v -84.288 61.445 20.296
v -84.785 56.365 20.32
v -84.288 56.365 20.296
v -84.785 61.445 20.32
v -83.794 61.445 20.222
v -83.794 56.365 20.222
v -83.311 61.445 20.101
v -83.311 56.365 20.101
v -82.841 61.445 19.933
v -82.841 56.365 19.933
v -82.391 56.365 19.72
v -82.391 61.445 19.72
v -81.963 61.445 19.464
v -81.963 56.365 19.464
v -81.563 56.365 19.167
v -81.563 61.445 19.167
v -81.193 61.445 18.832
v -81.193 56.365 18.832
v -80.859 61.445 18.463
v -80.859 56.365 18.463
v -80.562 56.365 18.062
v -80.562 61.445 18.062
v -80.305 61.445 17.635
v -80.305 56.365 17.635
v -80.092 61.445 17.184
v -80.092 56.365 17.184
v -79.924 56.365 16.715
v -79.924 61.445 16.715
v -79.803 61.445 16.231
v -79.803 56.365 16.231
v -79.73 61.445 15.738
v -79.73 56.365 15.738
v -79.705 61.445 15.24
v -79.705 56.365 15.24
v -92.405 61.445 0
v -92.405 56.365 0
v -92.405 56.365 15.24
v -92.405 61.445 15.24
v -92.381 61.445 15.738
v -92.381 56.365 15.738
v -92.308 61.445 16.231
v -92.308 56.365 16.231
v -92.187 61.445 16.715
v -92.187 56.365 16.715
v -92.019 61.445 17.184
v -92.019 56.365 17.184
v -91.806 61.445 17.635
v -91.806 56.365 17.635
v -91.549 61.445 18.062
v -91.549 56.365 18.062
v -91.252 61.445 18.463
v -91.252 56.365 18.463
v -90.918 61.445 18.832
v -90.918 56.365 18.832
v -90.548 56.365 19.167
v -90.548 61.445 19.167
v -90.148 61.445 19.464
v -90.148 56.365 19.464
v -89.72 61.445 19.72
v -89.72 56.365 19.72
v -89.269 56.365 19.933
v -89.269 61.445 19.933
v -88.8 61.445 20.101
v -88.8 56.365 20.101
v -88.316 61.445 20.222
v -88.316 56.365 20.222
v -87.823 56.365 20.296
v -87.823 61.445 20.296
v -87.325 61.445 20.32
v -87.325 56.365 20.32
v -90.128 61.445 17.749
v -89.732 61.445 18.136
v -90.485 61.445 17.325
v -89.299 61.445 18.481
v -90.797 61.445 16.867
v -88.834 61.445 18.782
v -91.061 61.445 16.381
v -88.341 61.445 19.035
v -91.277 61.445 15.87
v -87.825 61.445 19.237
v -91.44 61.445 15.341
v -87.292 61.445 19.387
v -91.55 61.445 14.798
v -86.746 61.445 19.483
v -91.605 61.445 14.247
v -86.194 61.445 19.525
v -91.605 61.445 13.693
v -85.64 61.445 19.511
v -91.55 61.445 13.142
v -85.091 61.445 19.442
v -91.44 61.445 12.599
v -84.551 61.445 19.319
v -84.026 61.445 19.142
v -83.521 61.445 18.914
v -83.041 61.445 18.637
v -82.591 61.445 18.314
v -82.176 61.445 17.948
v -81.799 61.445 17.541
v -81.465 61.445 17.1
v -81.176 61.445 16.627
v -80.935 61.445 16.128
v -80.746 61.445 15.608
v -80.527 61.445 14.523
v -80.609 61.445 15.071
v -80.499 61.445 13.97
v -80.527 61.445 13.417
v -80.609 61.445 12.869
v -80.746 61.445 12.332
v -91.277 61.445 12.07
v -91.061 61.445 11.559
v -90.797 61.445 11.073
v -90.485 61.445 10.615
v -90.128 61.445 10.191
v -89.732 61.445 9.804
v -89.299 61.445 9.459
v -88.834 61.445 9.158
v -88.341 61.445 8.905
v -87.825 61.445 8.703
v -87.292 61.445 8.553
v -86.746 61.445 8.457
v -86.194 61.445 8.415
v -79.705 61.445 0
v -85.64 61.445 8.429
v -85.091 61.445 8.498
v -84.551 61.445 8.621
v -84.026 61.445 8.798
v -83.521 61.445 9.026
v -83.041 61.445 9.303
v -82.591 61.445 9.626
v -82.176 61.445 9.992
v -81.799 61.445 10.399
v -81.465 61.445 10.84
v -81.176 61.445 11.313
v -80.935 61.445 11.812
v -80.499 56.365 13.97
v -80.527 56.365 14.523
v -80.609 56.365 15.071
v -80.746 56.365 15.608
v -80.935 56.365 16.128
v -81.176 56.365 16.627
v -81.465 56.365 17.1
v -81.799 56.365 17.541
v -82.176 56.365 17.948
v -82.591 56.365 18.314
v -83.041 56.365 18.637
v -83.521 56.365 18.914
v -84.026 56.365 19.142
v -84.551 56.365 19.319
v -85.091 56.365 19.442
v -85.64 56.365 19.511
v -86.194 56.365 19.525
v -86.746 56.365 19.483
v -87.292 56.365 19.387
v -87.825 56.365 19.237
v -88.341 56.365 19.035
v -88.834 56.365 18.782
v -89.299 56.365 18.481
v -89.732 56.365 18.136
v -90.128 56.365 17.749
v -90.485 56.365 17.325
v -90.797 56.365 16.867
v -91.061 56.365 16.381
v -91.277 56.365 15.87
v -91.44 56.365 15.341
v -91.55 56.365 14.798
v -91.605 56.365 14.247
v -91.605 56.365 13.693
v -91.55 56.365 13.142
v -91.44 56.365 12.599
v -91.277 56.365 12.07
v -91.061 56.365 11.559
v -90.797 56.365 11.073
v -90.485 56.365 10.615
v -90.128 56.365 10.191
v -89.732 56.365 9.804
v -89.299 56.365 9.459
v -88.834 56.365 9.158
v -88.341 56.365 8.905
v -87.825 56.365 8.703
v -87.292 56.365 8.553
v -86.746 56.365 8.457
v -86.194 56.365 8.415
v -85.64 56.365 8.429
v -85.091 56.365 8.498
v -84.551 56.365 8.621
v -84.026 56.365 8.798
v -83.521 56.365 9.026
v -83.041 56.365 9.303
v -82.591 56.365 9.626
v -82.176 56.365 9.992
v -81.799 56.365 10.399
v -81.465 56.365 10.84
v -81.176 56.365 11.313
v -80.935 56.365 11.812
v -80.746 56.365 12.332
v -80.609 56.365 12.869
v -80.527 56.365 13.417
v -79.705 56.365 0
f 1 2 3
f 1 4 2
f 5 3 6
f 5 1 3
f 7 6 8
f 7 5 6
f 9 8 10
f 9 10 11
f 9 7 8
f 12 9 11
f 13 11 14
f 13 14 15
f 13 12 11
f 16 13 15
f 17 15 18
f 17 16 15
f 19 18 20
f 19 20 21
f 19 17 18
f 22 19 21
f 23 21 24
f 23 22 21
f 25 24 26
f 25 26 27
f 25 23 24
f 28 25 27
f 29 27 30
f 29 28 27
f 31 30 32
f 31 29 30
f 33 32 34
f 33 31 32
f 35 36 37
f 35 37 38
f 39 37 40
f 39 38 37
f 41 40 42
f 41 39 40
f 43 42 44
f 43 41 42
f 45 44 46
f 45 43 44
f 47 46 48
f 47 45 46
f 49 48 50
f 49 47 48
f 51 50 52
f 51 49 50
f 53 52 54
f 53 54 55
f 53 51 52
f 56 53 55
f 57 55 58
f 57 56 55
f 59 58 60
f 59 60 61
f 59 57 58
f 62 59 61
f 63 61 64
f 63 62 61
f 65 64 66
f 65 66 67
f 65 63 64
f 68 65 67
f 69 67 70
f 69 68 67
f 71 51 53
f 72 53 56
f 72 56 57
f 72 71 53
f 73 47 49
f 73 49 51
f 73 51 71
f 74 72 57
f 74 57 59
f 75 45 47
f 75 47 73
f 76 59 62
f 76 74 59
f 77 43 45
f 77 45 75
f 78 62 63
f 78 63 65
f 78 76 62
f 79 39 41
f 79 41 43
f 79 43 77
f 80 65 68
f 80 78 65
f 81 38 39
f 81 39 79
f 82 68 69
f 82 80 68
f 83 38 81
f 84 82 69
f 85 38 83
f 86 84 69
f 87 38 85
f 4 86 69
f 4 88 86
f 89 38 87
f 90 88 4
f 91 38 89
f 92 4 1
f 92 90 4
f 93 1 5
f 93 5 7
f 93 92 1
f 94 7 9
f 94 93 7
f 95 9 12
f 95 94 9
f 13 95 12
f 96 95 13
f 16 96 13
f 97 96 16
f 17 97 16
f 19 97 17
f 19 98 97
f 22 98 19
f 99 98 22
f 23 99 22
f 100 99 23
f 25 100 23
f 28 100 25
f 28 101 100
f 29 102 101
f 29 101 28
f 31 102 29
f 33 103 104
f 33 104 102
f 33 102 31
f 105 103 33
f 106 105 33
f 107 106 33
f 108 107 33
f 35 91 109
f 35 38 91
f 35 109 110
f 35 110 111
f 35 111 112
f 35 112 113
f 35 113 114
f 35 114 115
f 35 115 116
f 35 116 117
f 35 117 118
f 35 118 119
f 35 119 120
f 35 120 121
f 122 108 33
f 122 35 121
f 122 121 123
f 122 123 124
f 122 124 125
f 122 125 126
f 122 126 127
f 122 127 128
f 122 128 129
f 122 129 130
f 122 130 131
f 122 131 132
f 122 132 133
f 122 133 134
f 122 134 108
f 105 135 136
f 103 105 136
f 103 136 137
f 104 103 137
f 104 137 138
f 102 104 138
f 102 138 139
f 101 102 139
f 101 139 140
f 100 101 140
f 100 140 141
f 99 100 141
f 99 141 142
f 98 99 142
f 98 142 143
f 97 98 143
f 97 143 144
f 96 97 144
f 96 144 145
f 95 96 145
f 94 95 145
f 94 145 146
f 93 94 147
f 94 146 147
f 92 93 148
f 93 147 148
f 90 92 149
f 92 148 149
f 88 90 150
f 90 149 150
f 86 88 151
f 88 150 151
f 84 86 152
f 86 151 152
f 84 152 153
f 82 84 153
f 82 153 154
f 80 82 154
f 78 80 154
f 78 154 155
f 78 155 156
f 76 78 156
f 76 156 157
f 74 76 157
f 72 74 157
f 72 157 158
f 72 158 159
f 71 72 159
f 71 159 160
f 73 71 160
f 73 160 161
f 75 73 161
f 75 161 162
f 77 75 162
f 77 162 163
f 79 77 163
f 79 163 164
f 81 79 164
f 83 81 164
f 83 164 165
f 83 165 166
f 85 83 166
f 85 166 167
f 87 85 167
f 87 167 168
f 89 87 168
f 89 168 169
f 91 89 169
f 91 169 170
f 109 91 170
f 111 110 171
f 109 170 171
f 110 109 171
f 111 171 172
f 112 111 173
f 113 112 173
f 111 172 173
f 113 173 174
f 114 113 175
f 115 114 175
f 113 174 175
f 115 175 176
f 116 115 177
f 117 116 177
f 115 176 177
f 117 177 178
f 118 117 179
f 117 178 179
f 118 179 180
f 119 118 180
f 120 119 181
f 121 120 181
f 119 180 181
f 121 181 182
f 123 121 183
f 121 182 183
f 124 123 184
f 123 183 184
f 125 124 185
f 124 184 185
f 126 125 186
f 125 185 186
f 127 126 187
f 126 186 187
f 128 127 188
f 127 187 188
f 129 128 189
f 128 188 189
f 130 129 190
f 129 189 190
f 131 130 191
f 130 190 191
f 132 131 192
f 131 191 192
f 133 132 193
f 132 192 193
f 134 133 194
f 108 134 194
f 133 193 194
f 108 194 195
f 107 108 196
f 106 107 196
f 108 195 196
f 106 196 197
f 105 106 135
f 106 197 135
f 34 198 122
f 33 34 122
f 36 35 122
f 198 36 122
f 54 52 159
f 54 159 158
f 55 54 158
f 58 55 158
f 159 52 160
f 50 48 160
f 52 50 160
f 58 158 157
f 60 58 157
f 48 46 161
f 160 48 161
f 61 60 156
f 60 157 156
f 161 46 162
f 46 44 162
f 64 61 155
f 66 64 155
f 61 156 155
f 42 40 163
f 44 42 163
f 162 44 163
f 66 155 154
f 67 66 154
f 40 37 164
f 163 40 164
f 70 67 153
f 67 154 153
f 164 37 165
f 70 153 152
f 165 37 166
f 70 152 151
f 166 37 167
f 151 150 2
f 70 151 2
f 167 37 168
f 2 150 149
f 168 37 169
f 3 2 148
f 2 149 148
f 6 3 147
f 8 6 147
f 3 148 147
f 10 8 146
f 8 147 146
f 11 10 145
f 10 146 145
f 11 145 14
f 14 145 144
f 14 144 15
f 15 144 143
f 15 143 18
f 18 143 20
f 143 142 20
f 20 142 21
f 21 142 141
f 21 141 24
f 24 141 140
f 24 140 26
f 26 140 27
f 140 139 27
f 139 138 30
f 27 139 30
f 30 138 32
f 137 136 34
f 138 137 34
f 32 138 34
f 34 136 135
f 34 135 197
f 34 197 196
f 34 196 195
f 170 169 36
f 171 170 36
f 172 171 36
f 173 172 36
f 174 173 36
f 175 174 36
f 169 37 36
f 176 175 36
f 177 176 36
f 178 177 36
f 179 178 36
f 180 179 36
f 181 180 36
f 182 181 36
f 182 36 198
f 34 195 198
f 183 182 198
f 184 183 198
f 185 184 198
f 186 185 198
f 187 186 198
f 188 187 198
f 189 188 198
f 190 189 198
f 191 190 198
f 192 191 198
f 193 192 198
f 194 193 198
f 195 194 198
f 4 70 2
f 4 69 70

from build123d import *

# Parameters (mm, degrees)
F0_W     = 12.7
F0_H     = 5.08
F1_DEPTH = 7.62
F2_W     = 12.7
F2_H     = 5.08
F3_DEPTH = 12.7
F4_R     = 5.55625
F5_DEPTH = 25.4
F6_R     = 5.08


with BuildPart() as f1:
    # F0 (on Top) → F1 (new body)
    with BuildSketch(Plane.XY):
        with Locations((-86.055439, 58.905405)):
            Rectangle(F0_W, F0_H)
    extrude(amount=F1_DEPTH)

    # F2 (on face) → F3 (join)
    with BuildSketch(Plane.XY.offset(7.62)):
        with Locations((-86.055439, 58.905405)):
            Rectangle(F2_W, F2_H)
    extrude(amount=F3_DEPTH)

    # F4 (on face) → F5 (cut)
    with BuildSketch(Plane.XZ.offset(-56.365405)):
        with Locations((-86.055439, 13.97)):
            Circle(F4_R)
    extrude(amount=-F5_DEPTH, mode=Mode.SUBTRACT)

    # F6
    f6_edges = [f1.edges().sort_by_distance(p)[0] for p in [
        (-92.405439, 58.905405, 20.32),
        (-79.705439, 58.905405, 20.32),
    ]]
    fillet(f6_edges, radius=F6_R)


solid = f1.part
